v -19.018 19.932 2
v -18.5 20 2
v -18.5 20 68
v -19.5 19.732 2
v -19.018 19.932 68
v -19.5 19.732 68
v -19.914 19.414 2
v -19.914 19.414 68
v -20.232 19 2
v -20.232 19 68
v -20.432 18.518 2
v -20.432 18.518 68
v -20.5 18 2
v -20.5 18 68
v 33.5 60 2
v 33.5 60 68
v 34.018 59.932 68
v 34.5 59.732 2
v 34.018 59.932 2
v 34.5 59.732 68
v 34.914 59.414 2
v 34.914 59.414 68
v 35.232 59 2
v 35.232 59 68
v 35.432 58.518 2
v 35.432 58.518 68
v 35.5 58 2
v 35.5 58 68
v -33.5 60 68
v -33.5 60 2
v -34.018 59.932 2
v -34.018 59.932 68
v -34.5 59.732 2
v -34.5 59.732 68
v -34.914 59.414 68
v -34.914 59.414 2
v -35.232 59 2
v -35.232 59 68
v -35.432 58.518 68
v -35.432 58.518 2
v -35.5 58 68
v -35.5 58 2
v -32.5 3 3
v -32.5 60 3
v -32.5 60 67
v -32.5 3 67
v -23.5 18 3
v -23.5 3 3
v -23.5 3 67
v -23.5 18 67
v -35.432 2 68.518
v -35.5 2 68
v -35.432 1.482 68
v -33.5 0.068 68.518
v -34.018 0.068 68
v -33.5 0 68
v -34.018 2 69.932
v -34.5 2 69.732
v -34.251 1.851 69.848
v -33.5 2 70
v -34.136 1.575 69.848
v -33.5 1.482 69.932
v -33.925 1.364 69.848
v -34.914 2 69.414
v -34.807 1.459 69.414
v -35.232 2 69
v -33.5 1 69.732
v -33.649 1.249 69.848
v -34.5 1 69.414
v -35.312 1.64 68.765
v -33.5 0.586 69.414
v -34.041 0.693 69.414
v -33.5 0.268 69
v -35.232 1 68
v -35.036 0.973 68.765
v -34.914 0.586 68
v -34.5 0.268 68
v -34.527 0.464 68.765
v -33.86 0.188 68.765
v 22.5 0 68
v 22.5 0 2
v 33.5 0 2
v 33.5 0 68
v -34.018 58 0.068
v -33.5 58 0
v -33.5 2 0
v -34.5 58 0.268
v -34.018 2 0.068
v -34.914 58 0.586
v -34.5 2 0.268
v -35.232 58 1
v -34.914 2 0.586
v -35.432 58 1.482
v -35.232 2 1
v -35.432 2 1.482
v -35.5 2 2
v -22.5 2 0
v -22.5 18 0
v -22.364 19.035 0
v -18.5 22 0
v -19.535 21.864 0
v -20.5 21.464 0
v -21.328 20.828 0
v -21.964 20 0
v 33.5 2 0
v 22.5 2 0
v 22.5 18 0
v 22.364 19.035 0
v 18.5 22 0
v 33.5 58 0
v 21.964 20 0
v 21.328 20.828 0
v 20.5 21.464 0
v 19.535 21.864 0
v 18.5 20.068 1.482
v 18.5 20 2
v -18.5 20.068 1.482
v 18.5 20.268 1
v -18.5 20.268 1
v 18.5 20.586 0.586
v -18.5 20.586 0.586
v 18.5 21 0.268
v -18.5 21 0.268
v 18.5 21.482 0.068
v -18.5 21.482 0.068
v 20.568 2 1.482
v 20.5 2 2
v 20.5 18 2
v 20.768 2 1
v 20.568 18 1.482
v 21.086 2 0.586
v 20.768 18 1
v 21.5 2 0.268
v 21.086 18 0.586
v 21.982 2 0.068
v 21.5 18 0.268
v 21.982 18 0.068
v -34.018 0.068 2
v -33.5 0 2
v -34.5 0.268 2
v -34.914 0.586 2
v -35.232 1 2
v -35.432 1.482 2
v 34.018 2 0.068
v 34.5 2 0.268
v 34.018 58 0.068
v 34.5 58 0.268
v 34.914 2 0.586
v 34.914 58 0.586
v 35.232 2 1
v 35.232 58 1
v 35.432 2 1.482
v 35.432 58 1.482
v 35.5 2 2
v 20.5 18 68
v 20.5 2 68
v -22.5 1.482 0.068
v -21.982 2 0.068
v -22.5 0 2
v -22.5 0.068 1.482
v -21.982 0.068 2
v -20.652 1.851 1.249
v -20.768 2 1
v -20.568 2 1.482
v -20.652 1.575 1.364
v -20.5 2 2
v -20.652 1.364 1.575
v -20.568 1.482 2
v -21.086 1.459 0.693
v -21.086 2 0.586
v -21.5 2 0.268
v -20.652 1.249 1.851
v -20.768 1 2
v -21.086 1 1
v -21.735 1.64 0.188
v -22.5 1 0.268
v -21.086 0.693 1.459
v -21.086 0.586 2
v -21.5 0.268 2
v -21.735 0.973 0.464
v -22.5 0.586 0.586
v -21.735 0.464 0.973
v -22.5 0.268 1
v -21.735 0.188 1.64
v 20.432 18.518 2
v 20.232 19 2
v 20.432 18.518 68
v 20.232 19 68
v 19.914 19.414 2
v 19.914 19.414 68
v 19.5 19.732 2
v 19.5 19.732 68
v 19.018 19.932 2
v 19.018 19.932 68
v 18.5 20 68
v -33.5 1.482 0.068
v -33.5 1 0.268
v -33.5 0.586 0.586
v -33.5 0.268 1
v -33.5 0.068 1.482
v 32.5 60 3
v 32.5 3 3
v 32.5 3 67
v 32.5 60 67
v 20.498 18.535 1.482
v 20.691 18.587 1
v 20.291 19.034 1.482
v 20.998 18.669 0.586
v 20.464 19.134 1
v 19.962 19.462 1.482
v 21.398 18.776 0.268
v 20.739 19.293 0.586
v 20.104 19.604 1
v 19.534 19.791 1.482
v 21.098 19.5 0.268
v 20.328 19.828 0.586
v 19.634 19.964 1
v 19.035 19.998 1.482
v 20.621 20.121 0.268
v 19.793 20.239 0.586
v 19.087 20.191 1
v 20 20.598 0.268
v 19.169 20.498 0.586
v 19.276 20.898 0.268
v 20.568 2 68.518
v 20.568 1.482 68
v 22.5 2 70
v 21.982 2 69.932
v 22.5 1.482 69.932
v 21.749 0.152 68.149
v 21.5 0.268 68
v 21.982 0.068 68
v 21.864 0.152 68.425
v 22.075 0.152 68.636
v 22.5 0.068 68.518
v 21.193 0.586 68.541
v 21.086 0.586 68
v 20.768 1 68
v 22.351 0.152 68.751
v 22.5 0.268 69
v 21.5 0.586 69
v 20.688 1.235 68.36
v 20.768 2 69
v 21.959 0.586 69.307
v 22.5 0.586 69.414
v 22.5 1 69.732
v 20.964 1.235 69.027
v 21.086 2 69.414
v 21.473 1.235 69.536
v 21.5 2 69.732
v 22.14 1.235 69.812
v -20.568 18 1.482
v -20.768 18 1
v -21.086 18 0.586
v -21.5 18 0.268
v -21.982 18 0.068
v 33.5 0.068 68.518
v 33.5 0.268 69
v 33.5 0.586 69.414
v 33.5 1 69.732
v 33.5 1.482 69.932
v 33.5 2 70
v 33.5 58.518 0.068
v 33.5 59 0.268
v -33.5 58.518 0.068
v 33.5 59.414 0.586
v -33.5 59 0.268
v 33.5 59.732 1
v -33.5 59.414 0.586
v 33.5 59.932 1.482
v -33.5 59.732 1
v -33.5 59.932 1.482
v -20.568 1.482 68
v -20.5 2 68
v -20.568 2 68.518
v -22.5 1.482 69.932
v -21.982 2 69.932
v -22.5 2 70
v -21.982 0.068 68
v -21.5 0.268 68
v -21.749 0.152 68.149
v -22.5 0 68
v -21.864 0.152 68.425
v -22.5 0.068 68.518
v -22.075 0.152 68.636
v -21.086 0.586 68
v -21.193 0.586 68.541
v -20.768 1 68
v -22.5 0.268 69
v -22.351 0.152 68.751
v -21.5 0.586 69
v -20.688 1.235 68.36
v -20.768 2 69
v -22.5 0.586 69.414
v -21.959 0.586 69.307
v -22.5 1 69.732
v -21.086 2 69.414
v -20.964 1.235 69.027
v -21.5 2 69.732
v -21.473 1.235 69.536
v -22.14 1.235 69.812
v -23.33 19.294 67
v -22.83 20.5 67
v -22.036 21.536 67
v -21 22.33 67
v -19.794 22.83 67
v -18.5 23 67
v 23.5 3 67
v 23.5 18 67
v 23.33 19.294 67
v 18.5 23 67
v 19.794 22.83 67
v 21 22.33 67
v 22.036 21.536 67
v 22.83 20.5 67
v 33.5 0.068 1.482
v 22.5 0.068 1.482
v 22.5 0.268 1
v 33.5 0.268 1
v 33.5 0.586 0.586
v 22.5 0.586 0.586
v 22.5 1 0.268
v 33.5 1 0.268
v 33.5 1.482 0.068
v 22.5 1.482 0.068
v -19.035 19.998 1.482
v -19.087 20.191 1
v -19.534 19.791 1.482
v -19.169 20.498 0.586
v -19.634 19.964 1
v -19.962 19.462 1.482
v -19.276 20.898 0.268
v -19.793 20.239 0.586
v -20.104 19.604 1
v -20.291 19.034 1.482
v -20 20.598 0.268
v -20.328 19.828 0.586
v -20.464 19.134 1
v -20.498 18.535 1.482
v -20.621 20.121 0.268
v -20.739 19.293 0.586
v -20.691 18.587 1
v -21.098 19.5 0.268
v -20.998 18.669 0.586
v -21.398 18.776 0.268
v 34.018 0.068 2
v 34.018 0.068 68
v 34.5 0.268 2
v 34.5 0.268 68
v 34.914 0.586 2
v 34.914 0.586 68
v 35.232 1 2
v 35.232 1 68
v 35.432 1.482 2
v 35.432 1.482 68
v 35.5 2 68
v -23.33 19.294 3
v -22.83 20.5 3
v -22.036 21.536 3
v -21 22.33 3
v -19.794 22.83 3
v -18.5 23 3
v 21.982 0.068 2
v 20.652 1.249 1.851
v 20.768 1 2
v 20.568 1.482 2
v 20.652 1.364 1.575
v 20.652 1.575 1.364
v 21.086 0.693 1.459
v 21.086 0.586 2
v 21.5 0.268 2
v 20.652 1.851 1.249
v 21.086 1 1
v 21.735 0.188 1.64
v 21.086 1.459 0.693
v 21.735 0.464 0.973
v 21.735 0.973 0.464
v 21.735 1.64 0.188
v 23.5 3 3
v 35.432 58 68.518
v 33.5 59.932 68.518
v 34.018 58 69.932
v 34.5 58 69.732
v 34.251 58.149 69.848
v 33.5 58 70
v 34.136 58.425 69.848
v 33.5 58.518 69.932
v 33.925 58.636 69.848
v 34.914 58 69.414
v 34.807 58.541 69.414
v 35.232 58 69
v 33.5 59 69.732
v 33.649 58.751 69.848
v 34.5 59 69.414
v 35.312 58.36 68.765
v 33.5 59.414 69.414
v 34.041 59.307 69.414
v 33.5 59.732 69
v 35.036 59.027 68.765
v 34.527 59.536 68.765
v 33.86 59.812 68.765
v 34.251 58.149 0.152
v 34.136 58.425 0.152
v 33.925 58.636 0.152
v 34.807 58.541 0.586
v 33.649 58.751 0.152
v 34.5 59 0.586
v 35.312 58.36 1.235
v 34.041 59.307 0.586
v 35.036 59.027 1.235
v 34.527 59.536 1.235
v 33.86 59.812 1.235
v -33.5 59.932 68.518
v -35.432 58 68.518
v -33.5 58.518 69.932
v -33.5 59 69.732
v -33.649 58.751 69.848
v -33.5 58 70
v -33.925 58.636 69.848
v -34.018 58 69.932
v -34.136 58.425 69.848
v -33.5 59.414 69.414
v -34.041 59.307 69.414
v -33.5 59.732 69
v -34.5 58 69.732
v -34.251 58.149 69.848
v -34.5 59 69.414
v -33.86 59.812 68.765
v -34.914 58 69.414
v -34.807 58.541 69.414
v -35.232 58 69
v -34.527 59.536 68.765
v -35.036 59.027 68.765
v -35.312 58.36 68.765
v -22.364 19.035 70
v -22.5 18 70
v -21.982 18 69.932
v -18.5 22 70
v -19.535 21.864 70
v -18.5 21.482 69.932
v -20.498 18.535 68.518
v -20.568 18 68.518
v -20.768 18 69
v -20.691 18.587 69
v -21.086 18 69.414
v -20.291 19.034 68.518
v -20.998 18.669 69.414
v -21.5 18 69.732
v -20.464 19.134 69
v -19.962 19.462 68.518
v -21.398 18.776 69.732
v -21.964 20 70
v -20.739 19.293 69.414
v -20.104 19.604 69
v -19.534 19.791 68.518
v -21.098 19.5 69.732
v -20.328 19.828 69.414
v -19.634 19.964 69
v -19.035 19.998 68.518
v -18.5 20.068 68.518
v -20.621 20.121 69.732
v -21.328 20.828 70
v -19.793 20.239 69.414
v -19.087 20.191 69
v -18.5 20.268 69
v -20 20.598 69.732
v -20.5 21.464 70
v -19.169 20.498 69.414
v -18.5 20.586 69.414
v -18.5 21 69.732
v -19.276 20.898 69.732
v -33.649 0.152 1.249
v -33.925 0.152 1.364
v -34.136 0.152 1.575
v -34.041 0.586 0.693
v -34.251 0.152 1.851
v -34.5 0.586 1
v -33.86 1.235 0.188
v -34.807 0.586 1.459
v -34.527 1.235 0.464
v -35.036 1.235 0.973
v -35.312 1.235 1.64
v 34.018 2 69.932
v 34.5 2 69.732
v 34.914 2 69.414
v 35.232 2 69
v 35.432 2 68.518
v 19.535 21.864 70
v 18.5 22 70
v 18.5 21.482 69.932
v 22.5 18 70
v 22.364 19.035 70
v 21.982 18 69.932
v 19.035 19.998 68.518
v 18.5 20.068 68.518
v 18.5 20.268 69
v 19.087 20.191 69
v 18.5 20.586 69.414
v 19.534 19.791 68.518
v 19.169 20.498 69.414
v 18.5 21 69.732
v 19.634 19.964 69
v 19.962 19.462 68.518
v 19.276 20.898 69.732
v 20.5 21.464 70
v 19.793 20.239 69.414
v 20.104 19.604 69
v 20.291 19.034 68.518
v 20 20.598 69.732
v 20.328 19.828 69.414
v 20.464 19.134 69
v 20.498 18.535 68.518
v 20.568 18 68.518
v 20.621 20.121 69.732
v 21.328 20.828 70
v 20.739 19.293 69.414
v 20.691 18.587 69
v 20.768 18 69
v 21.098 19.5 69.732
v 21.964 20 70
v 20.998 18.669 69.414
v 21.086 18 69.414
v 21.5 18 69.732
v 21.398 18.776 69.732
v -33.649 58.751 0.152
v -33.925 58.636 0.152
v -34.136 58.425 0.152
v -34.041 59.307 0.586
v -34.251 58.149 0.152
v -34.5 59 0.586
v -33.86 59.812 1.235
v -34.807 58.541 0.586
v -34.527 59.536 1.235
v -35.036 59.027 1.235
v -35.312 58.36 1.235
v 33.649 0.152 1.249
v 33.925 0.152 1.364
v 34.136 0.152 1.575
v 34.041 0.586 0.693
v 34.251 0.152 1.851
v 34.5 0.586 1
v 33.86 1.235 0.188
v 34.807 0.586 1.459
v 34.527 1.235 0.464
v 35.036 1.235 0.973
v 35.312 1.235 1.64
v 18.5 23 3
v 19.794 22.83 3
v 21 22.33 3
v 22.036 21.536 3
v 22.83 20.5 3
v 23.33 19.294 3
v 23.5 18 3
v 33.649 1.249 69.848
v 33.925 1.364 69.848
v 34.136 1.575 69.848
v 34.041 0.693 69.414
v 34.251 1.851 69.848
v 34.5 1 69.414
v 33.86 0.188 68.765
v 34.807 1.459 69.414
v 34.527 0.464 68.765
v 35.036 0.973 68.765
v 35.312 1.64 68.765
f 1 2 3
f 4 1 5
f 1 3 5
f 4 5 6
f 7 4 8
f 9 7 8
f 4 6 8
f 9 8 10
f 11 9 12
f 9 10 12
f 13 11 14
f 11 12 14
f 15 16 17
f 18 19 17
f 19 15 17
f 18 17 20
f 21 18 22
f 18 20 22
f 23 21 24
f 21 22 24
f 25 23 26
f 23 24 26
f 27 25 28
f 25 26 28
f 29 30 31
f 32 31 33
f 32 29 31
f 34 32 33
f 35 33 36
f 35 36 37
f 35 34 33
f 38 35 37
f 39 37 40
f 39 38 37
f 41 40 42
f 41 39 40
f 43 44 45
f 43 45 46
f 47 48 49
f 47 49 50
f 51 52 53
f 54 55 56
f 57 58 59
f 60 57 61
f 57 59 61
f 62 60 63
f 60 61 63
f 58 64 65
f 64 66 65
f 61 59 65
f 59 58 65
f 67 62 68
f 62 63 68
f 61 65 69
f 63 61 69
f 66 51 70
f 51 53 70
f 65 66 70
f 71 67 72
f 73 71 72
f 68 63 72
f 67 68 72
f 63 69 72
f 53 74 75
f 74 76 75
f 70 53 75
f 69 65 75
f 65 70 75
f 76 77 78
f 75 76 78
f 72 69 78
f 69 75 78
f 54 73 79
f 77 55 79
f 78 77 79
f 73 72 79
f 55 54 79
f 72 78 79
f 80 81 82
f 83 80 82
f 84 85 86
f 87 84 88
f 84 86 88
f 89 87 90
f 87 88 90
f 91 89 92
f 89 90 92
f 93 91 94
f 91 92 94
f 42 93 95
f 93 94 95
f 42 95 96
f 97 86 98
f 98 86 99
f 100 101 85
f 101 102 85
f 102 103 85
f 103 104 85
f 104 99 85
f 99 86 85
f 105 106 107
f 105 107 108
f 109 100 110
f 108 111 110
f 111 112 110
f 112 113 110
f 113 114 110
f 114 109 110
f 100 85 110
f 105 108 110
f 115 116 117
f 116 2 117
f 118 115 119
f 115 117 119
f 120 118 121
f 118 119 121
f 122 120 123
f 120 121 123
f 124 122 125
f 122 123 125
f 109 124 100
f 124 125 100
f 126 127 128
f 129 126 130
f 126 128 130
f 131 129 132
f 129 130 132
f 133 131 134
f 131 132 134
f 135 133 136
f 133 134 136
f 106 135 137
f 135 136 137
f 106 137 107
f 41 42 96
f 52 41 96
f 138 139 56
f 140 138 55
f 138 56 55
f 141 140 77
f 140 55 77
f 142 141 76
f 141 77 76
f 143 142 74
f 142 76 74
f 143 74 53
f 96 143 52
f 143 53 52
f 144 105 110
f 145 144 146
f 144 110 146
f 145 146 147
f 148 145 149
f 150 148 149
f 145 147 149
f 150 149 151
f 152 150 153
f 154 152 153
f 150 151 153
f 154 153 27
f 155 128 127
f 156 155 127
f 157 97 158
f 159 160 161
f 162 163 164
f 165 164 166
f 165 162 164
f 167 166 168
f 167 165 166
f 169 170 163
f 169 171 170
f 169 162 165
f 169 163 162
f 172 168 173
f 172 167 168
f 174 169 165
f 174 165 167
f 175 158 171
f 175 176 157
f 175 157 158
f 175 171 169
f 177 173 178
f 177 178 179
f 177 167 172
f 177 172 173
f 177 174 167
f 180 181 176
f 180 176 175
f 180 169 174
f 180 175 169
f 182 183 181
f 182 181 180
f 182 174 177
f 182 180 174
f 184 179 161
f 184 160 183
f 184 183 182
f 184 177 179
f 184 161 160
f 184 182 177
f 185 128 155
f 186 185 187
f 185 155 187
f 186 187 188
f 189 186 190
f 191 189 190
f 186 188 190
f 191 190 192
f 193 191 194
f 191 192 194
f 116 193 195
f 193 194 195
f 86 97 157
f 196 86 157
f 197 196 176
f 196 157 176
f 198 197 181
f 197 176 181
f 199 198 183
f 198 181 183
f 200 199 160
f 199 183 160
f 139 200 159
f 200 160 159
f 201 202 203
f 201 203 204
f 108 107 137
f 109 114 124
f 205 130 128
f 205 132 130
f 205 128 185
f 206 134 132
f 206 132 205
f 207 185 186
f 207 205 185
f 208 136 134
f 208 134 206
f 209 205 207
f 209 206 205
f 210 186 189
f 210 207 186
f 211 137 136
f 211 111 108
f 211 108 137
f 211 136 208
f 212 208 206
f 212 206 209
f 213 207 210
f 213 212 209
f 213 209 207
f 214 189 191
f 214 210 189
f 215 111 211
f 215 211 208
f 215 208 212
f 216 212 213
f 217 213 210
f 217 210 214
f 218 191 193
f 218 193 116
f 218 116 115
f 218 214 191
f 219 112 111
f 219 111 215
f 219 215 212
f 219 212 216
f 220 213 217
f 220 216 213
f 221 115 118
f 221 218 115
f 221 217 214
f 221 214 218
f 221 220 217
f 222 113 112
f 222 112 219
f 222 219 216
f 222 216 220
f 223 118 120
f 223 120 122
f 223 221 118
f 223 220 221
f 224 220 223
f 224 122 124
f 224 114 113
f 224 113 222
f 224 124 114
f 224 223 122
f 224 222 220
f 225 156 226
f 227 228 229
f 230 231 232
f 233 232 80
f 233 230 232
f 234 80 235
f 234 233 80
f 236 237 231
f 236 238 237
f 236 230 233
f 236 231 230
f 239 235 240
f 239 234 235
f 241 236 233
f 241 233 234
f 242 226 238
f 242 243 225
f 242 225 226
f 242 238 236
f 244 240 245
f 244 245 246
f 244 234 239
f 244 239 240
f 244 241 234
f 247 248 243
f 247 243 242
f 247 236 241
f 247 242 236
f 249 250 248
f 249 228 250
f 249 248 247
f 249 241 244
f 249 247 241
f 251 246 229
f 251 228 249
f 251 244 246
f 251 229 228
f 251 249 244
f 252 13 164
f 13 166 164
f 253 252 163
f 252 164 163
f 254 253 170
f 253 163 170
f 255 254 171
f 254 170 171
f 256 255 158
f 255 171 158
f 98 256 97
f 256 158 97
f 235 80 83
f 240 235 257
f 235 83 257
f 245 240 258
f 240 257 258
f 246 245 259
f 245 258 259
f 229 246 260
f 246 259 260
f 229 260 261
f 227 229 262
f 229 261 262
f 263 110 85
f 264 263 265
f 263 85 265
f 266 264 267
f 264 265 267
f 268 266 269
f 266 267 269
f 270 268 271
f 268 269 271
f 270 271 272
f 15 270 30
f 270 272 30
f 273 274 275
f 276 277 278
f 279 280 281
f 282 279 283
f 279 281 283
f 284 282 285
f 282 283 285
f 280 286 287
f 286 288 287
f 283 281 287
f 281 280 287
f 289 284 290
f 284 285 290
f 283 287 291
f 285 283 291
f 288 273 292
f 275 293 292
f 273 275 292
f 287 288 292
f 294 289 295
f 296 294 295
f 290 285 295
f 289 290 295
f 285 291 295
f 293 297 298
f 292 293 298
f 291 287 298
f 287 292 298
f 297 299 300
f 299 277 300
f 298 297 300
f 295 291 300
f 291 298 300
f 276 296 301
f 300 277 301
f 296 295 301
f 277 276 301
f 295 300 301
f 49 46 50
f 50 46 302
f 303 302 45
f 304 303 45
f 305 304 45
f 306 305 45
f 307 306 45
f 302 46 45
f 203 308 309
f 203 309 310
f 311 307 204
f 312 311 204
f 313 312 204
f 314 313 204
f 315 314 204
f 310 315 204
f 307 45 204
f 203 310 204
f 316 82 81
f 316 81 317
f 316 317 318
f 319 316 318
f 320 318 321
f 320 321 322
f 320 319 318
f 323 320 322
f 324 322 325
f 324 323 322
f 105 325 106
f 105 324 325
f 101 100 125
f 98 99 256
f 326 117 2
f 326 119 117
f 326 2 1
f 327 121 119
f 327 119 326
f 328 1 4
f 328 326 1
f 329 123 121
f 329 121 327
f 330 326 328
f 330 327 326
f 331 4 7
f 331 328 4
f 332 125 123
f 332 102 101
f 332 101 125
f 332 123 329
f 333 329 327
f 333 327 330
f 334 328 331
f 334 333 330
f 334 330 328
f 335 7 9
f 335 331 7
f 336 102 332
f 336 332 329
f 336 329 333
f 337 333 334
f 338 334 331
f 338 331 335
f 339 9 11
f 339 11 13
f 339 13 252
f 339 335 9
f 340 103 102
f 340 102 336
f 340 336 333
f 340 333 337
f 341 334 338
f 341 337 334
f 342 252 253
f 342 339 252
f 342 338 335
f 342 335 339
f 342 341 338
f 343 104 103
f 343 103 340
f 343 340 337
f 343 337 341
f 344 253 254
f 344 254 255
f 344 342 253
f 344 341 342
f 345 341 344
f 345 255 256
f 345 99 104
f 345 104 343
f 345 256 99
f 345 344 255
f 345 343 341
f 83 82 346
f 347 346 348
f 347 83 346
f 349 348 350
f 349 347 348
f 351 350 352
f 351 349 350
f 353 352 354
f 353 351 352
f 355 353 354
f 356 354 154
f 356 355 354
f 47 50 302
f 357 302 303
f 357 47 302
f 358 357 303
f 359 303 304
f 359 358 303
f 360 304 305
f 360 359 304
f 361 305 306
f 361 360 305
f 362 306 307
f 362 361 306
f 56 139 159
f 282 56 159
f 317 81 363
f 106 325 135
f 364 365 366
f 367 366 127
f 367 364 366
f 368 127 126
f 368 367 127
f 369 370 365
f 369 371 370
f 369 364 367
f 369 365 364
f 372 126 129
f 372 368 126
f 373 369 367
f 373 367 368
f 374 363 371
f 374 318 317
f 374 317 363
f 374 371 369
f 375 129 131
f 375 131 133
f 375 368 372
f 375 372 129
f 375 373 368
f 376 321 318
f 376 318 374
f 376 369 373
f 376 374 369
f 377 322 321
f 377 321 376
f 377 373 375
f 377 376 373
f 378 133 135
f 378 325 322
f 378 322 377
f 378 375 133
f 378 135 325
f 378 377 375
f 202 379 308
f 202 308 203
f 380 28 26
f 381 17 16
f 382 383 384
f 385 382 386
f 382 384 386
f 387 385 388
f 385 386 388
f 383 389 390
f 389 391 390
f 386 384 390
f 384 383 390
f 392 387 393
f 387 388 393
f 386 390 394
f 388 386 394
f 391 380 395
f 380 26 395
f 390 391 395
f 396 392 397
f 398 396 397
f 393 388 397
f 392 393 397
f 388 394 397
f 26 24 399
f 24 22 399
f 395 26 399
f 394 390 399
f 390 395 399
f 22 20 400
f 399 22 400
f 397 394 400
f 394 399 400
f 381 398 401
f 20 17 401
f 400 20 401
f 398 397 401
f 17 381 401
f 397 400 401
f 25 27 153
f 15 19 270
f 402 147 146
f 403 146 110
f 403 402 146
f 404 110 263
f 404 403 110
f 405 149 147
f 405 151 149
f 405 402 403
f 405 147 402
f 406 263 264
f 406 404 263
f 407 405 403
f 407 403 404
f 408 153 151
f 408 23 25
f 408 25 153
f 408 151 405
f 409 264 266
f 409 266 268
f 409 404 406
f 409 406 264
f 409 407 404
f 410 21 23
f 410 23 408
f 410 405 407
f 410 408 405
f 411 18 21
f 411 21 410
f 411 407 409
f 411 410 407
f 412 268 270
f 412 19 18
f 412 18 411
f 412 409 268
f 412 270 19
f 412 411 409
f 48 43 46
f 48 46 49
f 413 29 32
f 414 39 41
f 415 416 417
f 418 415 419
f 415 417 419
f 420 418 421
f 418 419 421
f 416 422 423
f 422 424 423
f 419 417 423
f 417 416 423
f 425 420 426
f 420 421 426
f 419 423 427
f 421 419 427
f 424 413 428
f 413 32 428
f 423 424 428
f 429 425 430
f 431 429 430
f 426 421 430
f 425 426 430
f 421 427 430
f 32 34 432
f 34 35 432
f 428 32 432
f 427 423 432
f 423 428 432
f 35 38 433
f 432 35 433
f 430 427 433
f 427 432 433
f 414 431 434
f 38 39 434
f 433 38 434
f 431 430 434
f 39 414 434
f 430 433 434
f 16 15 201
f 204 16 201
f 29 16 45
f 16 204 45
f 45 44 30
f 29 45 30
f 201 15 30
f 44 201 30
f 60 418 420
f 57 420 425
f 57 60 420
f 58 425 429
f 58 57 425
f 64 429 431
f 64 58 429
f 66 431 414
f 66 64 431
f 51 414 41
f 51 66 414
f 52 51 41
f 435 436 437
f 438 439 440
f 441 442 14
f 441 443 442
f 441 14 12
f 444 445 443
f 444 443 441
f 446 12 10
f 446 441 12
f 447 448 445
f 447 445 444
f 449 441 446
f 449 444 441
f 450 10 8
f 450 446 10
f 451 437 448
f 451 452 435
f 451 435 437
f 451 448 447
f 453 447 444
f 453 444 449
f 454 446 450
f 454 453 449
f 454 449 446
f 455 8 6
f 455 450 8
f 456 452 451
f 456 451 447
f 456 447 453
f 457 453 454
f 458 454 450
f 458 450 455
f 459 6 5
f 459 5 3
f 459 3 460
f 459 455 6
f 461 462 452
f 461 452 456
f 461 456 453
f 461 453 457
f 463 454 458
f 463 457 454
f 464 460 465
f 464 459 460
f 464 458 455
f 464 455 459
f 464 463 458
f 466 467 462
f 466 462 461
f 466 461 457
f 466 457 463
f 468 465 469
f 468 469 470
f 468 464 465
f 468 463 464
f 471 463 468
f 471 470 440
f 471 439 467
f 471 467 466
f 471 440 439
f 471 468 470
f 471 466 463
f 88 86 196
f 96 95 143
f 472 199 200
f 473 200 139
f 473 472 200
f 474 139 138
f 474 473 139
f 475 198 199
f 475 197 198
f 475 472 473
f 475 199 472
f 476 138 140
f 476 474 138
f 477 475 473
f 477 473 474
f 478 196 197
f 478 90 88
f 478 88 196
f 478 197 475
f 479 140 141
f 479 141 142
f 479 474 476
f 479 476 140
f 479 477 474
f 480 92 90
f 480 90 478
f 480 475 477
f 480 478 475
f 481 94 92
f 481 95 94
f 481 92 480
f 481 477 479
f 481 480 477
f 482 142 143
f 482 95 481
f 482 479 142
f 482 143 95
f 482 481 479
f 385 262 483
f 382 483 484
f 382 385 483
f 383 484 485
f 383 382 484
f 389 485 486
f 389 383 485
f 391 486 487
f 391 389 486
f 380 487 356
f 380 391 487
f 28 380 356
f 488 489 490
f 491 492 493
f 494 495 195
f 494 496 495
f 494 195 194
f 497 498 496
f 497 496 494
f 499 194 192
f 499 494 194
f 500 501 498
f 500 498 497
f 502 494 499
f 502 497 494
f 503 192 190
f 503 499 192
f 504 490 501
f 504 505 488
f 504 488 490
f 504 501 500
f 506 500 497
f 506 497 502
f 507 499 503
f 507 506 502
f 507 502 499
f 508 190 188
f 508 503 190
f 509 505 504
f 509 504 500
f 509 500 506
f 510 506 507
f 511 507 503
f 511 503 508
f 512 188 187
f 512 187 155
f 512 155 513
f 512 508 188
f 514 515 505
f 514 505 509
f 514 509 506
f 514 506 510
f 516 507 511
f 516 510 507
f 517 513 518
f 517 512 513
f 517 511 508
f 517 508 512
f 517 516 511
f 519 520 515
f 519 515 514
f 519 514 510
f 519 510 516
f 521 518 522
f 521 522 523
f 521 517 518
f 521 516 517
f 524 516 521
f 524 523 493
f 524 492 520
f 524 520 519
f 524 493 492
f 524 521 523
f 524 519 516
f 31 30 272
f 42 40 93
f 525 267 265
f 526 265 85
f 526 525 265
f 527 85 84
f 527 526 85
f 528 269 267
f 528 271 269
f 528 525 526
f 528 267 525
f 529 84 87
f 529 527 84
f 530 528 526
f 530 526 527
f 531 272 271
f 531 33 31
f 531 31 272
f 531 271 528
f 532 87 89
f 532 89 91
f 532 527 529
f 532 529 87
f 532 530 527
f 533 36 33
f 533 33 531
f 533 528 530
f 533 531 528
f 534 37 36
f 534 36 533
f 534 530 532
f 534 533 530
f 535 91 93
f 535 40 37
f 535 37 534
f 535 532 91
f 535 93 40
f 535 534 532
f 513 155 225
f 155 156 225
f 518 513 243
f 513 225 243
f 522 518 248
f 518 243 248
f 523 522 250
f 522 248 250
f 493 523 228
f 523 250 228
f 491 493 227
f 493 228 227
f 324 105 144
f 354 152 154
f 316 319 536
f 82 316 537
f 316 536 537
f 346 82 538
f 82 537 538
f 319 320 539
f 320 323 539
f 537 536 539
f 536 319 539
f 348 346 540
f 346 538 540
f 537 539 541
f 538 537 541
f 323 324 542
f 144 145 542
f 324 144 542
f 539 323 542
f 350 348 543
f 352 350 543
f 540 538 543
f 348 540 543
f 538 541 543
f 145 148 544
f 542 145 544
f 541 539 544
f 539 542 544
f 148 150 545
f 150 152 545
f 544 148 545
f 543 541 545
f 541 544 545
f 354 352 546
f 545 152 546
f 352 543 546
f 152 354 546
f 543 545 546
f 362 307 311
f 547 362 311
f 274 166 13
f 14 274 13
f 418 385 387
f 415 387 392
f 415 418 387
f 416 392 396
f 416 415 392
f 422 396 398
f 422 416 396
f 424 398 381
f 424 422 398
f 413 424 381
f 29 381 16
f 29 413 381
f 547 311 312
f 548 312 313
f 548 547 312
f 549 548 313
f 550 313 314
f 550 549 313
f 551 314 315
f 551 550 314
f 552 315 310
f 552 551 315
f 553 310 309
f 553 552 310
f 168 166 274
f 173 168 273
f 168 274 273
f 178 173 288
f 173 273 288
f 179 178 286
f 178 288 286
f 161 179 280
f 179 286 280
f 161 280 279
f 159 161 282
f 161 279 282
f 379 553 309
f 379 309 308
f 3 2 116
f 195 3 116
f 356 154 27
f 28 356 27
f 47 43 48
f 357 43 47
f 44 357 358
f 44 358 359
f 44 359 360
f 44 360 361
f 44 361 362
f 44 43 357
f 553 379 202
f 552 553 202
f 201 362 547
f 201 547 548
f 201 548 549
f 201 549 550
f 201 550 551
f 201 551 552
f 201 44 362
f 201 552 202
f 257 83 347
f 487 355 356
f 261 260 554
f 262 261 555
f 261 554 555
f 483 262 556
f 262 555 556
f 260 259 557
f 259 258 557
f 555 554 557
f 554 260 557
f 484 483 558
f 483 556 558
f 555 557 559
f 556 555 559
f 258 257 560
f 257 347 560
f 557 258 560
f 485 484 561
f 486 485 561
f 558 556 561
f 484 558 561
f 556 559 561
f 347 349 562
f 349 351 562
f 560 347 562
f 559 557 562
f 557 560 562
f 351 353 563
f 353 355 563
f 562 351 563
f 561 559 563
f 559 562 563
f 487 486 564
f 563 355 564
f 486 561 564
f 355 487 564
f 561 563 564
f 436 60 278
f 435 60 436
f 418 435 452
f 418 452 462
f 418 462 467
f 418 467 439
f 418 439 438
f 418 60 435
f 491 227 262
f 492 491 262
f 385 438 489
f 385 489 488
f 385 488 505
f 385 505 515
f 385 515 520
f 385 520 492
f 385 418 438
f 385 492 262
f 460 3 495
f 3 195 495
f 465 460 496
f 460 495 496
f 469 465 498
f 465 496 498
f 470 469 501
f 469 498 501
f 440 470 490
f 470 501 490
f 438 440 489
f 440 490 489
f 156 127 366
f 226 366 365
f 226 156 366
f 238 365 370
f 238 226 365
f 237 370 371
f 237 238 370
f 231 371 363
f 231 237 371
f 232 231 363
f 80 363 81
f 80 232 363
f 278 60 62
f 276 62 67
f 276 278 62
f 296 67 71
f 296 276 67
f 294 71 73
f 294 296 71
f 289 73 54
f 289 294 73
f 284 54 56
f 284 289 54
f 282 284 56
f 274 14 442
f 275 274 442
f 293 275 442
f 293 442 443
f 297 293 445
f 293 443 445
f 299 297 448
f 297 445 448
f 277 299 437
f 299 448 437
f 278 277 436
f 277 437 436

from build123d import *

# Parameters (mm, degrees)
BOSS_EXTRU_2_DEPTH = 70
CONG_4_R           = 2
CONG_3_R           = 2
CONG_5_R           = 2
CONG_6_R           = 2
COQUE1_START       = 3
COQUE1_DEPTH       = 64
CONG_7_R           = 2
CONG_8_R           = 2


# Read off the part's stored shape, not the designer's step: Coque1
with BuildPart() as part:
    # Esquisse2 → Boss.-Extru.2 (new body)
    with BuildSketch(Plane.XY):
        Polygon((-35.5, 0), (-20.5, 0), (-20.5, 20), (20.5, 20), (20.5, 0), (35.5, 0), (35.5, 60), (-35.5, 60), align=None)
    extrude(amount=BOSS_EXTRU_2_DEPTH)

    # Congé4
    cong_4_edges = [part.edges().sort_by_distance(p)[0] for p in [
        (-35.5, 60, 35),
    ]]
    fillet(cong_4_edges, radius=CONG_4_R)

    # Congé3
    cong_3_edges = [part.edges().sort_by_distance(p)[0] for p in [
        (35.5, 60, 35),
    ]]
    fillet(cong_3_edges, radius=CONG_3_R)

    # Congé5
    cong_5_edges = [part.edges().sort_by_distance(p)[0] for p in [
        (20.5, 20, 35),
    ]]
    fillet(cong_5_edges, radius=CONG_5_R)

    # Congé6
    cong_6_edges = [part.edges().sort_by_distance(p)[0] for p in [
        (-20.5, 20, 35),
    ]]
    fillet(cong_6_edges, radius=CONG_6_R)

    # Coque1 outline → Coque1 (cut)
    with BuildSketch(Plane.XY.offset(COQUE1_START)):
        with BuildLine():
            Line((-32.5, 60), (-32.5, 3))
            Line((-32.5, 3), (-23.5, 3))
            Line((-23.5, 3), (-23.5, 18))
            ThreePointArc((-23.5, 18), (-22.035533906, 21.535533906), (-18.5, 23))
            Line((-18.5, 23), (18.5, 23))
            ThreePointArc((18.5, 23), (22.035533906, 21.535533906), (23.5, 18))
            Line((23.5, 18), (23.5, 3))
            Line((23.5, 3), (32.5, 3))
            Line((32.5, 3), (32.5, 60))
            Line((32.5, 60), (-32.5, 60))
        make_face()
    extrude(amount=COQUE1_DEPTH, mode=Mode.SUBTRACT)

    # Congé7
    cong_7_edges = [part.edges().sort_by_distance(p)[0] for p in [
        (35.5, 29, 0),
        (34.914213562, 59.414213562, 0),
        (0, 60, 0),
        (-34.914213562, 59.414213562, 0),
        (-28, 0, 0),
        (-35.5, 0, 35),
        (-35.5, 29, 0),
    ]]
    fillet(cong_7_edges, radius=CONG_7_R)

    # Congé8
    cong_8_edges = [part.edges().sort_by_distance(p)[0] for p in [
        (-20.5, 9, 70),
        (35.5, 0, 36),
        (20.5, 0, 35),
        (-20.5, 0, 36),
        (28, 0, 70),
        (35.5, 29, 70),
        (-35.5, 30, 70),
        (-34.914213562, 59.414213562, 70),
        (0, 60, 70),
        (34.914213562, 59.414213562, 70),
        (20.5, 9, 0),
        (20.5, 9, 70),
        (19.914213562, 19.414213562, 0),
        (19.914213562, 19.414213562, 70),
        (0, 20, 0),
        (0, 20, 70),
        (-19.914213562, 19.414213562, 0),
        (-19.914213562, 19.414213562, 70),
        (-20.5, 10, 0),
        (34.914213562, 0, 0.585786438),
        (-27, 0, 70),
        (-20.5, 0.585786438, 0.585786438),
        (-34.914213562, 0.585786438, 70),
        (27, 0, 0),
    ]]
    fillet(cong_8_edges, radius=CONG_8_R)


solid = part.part
